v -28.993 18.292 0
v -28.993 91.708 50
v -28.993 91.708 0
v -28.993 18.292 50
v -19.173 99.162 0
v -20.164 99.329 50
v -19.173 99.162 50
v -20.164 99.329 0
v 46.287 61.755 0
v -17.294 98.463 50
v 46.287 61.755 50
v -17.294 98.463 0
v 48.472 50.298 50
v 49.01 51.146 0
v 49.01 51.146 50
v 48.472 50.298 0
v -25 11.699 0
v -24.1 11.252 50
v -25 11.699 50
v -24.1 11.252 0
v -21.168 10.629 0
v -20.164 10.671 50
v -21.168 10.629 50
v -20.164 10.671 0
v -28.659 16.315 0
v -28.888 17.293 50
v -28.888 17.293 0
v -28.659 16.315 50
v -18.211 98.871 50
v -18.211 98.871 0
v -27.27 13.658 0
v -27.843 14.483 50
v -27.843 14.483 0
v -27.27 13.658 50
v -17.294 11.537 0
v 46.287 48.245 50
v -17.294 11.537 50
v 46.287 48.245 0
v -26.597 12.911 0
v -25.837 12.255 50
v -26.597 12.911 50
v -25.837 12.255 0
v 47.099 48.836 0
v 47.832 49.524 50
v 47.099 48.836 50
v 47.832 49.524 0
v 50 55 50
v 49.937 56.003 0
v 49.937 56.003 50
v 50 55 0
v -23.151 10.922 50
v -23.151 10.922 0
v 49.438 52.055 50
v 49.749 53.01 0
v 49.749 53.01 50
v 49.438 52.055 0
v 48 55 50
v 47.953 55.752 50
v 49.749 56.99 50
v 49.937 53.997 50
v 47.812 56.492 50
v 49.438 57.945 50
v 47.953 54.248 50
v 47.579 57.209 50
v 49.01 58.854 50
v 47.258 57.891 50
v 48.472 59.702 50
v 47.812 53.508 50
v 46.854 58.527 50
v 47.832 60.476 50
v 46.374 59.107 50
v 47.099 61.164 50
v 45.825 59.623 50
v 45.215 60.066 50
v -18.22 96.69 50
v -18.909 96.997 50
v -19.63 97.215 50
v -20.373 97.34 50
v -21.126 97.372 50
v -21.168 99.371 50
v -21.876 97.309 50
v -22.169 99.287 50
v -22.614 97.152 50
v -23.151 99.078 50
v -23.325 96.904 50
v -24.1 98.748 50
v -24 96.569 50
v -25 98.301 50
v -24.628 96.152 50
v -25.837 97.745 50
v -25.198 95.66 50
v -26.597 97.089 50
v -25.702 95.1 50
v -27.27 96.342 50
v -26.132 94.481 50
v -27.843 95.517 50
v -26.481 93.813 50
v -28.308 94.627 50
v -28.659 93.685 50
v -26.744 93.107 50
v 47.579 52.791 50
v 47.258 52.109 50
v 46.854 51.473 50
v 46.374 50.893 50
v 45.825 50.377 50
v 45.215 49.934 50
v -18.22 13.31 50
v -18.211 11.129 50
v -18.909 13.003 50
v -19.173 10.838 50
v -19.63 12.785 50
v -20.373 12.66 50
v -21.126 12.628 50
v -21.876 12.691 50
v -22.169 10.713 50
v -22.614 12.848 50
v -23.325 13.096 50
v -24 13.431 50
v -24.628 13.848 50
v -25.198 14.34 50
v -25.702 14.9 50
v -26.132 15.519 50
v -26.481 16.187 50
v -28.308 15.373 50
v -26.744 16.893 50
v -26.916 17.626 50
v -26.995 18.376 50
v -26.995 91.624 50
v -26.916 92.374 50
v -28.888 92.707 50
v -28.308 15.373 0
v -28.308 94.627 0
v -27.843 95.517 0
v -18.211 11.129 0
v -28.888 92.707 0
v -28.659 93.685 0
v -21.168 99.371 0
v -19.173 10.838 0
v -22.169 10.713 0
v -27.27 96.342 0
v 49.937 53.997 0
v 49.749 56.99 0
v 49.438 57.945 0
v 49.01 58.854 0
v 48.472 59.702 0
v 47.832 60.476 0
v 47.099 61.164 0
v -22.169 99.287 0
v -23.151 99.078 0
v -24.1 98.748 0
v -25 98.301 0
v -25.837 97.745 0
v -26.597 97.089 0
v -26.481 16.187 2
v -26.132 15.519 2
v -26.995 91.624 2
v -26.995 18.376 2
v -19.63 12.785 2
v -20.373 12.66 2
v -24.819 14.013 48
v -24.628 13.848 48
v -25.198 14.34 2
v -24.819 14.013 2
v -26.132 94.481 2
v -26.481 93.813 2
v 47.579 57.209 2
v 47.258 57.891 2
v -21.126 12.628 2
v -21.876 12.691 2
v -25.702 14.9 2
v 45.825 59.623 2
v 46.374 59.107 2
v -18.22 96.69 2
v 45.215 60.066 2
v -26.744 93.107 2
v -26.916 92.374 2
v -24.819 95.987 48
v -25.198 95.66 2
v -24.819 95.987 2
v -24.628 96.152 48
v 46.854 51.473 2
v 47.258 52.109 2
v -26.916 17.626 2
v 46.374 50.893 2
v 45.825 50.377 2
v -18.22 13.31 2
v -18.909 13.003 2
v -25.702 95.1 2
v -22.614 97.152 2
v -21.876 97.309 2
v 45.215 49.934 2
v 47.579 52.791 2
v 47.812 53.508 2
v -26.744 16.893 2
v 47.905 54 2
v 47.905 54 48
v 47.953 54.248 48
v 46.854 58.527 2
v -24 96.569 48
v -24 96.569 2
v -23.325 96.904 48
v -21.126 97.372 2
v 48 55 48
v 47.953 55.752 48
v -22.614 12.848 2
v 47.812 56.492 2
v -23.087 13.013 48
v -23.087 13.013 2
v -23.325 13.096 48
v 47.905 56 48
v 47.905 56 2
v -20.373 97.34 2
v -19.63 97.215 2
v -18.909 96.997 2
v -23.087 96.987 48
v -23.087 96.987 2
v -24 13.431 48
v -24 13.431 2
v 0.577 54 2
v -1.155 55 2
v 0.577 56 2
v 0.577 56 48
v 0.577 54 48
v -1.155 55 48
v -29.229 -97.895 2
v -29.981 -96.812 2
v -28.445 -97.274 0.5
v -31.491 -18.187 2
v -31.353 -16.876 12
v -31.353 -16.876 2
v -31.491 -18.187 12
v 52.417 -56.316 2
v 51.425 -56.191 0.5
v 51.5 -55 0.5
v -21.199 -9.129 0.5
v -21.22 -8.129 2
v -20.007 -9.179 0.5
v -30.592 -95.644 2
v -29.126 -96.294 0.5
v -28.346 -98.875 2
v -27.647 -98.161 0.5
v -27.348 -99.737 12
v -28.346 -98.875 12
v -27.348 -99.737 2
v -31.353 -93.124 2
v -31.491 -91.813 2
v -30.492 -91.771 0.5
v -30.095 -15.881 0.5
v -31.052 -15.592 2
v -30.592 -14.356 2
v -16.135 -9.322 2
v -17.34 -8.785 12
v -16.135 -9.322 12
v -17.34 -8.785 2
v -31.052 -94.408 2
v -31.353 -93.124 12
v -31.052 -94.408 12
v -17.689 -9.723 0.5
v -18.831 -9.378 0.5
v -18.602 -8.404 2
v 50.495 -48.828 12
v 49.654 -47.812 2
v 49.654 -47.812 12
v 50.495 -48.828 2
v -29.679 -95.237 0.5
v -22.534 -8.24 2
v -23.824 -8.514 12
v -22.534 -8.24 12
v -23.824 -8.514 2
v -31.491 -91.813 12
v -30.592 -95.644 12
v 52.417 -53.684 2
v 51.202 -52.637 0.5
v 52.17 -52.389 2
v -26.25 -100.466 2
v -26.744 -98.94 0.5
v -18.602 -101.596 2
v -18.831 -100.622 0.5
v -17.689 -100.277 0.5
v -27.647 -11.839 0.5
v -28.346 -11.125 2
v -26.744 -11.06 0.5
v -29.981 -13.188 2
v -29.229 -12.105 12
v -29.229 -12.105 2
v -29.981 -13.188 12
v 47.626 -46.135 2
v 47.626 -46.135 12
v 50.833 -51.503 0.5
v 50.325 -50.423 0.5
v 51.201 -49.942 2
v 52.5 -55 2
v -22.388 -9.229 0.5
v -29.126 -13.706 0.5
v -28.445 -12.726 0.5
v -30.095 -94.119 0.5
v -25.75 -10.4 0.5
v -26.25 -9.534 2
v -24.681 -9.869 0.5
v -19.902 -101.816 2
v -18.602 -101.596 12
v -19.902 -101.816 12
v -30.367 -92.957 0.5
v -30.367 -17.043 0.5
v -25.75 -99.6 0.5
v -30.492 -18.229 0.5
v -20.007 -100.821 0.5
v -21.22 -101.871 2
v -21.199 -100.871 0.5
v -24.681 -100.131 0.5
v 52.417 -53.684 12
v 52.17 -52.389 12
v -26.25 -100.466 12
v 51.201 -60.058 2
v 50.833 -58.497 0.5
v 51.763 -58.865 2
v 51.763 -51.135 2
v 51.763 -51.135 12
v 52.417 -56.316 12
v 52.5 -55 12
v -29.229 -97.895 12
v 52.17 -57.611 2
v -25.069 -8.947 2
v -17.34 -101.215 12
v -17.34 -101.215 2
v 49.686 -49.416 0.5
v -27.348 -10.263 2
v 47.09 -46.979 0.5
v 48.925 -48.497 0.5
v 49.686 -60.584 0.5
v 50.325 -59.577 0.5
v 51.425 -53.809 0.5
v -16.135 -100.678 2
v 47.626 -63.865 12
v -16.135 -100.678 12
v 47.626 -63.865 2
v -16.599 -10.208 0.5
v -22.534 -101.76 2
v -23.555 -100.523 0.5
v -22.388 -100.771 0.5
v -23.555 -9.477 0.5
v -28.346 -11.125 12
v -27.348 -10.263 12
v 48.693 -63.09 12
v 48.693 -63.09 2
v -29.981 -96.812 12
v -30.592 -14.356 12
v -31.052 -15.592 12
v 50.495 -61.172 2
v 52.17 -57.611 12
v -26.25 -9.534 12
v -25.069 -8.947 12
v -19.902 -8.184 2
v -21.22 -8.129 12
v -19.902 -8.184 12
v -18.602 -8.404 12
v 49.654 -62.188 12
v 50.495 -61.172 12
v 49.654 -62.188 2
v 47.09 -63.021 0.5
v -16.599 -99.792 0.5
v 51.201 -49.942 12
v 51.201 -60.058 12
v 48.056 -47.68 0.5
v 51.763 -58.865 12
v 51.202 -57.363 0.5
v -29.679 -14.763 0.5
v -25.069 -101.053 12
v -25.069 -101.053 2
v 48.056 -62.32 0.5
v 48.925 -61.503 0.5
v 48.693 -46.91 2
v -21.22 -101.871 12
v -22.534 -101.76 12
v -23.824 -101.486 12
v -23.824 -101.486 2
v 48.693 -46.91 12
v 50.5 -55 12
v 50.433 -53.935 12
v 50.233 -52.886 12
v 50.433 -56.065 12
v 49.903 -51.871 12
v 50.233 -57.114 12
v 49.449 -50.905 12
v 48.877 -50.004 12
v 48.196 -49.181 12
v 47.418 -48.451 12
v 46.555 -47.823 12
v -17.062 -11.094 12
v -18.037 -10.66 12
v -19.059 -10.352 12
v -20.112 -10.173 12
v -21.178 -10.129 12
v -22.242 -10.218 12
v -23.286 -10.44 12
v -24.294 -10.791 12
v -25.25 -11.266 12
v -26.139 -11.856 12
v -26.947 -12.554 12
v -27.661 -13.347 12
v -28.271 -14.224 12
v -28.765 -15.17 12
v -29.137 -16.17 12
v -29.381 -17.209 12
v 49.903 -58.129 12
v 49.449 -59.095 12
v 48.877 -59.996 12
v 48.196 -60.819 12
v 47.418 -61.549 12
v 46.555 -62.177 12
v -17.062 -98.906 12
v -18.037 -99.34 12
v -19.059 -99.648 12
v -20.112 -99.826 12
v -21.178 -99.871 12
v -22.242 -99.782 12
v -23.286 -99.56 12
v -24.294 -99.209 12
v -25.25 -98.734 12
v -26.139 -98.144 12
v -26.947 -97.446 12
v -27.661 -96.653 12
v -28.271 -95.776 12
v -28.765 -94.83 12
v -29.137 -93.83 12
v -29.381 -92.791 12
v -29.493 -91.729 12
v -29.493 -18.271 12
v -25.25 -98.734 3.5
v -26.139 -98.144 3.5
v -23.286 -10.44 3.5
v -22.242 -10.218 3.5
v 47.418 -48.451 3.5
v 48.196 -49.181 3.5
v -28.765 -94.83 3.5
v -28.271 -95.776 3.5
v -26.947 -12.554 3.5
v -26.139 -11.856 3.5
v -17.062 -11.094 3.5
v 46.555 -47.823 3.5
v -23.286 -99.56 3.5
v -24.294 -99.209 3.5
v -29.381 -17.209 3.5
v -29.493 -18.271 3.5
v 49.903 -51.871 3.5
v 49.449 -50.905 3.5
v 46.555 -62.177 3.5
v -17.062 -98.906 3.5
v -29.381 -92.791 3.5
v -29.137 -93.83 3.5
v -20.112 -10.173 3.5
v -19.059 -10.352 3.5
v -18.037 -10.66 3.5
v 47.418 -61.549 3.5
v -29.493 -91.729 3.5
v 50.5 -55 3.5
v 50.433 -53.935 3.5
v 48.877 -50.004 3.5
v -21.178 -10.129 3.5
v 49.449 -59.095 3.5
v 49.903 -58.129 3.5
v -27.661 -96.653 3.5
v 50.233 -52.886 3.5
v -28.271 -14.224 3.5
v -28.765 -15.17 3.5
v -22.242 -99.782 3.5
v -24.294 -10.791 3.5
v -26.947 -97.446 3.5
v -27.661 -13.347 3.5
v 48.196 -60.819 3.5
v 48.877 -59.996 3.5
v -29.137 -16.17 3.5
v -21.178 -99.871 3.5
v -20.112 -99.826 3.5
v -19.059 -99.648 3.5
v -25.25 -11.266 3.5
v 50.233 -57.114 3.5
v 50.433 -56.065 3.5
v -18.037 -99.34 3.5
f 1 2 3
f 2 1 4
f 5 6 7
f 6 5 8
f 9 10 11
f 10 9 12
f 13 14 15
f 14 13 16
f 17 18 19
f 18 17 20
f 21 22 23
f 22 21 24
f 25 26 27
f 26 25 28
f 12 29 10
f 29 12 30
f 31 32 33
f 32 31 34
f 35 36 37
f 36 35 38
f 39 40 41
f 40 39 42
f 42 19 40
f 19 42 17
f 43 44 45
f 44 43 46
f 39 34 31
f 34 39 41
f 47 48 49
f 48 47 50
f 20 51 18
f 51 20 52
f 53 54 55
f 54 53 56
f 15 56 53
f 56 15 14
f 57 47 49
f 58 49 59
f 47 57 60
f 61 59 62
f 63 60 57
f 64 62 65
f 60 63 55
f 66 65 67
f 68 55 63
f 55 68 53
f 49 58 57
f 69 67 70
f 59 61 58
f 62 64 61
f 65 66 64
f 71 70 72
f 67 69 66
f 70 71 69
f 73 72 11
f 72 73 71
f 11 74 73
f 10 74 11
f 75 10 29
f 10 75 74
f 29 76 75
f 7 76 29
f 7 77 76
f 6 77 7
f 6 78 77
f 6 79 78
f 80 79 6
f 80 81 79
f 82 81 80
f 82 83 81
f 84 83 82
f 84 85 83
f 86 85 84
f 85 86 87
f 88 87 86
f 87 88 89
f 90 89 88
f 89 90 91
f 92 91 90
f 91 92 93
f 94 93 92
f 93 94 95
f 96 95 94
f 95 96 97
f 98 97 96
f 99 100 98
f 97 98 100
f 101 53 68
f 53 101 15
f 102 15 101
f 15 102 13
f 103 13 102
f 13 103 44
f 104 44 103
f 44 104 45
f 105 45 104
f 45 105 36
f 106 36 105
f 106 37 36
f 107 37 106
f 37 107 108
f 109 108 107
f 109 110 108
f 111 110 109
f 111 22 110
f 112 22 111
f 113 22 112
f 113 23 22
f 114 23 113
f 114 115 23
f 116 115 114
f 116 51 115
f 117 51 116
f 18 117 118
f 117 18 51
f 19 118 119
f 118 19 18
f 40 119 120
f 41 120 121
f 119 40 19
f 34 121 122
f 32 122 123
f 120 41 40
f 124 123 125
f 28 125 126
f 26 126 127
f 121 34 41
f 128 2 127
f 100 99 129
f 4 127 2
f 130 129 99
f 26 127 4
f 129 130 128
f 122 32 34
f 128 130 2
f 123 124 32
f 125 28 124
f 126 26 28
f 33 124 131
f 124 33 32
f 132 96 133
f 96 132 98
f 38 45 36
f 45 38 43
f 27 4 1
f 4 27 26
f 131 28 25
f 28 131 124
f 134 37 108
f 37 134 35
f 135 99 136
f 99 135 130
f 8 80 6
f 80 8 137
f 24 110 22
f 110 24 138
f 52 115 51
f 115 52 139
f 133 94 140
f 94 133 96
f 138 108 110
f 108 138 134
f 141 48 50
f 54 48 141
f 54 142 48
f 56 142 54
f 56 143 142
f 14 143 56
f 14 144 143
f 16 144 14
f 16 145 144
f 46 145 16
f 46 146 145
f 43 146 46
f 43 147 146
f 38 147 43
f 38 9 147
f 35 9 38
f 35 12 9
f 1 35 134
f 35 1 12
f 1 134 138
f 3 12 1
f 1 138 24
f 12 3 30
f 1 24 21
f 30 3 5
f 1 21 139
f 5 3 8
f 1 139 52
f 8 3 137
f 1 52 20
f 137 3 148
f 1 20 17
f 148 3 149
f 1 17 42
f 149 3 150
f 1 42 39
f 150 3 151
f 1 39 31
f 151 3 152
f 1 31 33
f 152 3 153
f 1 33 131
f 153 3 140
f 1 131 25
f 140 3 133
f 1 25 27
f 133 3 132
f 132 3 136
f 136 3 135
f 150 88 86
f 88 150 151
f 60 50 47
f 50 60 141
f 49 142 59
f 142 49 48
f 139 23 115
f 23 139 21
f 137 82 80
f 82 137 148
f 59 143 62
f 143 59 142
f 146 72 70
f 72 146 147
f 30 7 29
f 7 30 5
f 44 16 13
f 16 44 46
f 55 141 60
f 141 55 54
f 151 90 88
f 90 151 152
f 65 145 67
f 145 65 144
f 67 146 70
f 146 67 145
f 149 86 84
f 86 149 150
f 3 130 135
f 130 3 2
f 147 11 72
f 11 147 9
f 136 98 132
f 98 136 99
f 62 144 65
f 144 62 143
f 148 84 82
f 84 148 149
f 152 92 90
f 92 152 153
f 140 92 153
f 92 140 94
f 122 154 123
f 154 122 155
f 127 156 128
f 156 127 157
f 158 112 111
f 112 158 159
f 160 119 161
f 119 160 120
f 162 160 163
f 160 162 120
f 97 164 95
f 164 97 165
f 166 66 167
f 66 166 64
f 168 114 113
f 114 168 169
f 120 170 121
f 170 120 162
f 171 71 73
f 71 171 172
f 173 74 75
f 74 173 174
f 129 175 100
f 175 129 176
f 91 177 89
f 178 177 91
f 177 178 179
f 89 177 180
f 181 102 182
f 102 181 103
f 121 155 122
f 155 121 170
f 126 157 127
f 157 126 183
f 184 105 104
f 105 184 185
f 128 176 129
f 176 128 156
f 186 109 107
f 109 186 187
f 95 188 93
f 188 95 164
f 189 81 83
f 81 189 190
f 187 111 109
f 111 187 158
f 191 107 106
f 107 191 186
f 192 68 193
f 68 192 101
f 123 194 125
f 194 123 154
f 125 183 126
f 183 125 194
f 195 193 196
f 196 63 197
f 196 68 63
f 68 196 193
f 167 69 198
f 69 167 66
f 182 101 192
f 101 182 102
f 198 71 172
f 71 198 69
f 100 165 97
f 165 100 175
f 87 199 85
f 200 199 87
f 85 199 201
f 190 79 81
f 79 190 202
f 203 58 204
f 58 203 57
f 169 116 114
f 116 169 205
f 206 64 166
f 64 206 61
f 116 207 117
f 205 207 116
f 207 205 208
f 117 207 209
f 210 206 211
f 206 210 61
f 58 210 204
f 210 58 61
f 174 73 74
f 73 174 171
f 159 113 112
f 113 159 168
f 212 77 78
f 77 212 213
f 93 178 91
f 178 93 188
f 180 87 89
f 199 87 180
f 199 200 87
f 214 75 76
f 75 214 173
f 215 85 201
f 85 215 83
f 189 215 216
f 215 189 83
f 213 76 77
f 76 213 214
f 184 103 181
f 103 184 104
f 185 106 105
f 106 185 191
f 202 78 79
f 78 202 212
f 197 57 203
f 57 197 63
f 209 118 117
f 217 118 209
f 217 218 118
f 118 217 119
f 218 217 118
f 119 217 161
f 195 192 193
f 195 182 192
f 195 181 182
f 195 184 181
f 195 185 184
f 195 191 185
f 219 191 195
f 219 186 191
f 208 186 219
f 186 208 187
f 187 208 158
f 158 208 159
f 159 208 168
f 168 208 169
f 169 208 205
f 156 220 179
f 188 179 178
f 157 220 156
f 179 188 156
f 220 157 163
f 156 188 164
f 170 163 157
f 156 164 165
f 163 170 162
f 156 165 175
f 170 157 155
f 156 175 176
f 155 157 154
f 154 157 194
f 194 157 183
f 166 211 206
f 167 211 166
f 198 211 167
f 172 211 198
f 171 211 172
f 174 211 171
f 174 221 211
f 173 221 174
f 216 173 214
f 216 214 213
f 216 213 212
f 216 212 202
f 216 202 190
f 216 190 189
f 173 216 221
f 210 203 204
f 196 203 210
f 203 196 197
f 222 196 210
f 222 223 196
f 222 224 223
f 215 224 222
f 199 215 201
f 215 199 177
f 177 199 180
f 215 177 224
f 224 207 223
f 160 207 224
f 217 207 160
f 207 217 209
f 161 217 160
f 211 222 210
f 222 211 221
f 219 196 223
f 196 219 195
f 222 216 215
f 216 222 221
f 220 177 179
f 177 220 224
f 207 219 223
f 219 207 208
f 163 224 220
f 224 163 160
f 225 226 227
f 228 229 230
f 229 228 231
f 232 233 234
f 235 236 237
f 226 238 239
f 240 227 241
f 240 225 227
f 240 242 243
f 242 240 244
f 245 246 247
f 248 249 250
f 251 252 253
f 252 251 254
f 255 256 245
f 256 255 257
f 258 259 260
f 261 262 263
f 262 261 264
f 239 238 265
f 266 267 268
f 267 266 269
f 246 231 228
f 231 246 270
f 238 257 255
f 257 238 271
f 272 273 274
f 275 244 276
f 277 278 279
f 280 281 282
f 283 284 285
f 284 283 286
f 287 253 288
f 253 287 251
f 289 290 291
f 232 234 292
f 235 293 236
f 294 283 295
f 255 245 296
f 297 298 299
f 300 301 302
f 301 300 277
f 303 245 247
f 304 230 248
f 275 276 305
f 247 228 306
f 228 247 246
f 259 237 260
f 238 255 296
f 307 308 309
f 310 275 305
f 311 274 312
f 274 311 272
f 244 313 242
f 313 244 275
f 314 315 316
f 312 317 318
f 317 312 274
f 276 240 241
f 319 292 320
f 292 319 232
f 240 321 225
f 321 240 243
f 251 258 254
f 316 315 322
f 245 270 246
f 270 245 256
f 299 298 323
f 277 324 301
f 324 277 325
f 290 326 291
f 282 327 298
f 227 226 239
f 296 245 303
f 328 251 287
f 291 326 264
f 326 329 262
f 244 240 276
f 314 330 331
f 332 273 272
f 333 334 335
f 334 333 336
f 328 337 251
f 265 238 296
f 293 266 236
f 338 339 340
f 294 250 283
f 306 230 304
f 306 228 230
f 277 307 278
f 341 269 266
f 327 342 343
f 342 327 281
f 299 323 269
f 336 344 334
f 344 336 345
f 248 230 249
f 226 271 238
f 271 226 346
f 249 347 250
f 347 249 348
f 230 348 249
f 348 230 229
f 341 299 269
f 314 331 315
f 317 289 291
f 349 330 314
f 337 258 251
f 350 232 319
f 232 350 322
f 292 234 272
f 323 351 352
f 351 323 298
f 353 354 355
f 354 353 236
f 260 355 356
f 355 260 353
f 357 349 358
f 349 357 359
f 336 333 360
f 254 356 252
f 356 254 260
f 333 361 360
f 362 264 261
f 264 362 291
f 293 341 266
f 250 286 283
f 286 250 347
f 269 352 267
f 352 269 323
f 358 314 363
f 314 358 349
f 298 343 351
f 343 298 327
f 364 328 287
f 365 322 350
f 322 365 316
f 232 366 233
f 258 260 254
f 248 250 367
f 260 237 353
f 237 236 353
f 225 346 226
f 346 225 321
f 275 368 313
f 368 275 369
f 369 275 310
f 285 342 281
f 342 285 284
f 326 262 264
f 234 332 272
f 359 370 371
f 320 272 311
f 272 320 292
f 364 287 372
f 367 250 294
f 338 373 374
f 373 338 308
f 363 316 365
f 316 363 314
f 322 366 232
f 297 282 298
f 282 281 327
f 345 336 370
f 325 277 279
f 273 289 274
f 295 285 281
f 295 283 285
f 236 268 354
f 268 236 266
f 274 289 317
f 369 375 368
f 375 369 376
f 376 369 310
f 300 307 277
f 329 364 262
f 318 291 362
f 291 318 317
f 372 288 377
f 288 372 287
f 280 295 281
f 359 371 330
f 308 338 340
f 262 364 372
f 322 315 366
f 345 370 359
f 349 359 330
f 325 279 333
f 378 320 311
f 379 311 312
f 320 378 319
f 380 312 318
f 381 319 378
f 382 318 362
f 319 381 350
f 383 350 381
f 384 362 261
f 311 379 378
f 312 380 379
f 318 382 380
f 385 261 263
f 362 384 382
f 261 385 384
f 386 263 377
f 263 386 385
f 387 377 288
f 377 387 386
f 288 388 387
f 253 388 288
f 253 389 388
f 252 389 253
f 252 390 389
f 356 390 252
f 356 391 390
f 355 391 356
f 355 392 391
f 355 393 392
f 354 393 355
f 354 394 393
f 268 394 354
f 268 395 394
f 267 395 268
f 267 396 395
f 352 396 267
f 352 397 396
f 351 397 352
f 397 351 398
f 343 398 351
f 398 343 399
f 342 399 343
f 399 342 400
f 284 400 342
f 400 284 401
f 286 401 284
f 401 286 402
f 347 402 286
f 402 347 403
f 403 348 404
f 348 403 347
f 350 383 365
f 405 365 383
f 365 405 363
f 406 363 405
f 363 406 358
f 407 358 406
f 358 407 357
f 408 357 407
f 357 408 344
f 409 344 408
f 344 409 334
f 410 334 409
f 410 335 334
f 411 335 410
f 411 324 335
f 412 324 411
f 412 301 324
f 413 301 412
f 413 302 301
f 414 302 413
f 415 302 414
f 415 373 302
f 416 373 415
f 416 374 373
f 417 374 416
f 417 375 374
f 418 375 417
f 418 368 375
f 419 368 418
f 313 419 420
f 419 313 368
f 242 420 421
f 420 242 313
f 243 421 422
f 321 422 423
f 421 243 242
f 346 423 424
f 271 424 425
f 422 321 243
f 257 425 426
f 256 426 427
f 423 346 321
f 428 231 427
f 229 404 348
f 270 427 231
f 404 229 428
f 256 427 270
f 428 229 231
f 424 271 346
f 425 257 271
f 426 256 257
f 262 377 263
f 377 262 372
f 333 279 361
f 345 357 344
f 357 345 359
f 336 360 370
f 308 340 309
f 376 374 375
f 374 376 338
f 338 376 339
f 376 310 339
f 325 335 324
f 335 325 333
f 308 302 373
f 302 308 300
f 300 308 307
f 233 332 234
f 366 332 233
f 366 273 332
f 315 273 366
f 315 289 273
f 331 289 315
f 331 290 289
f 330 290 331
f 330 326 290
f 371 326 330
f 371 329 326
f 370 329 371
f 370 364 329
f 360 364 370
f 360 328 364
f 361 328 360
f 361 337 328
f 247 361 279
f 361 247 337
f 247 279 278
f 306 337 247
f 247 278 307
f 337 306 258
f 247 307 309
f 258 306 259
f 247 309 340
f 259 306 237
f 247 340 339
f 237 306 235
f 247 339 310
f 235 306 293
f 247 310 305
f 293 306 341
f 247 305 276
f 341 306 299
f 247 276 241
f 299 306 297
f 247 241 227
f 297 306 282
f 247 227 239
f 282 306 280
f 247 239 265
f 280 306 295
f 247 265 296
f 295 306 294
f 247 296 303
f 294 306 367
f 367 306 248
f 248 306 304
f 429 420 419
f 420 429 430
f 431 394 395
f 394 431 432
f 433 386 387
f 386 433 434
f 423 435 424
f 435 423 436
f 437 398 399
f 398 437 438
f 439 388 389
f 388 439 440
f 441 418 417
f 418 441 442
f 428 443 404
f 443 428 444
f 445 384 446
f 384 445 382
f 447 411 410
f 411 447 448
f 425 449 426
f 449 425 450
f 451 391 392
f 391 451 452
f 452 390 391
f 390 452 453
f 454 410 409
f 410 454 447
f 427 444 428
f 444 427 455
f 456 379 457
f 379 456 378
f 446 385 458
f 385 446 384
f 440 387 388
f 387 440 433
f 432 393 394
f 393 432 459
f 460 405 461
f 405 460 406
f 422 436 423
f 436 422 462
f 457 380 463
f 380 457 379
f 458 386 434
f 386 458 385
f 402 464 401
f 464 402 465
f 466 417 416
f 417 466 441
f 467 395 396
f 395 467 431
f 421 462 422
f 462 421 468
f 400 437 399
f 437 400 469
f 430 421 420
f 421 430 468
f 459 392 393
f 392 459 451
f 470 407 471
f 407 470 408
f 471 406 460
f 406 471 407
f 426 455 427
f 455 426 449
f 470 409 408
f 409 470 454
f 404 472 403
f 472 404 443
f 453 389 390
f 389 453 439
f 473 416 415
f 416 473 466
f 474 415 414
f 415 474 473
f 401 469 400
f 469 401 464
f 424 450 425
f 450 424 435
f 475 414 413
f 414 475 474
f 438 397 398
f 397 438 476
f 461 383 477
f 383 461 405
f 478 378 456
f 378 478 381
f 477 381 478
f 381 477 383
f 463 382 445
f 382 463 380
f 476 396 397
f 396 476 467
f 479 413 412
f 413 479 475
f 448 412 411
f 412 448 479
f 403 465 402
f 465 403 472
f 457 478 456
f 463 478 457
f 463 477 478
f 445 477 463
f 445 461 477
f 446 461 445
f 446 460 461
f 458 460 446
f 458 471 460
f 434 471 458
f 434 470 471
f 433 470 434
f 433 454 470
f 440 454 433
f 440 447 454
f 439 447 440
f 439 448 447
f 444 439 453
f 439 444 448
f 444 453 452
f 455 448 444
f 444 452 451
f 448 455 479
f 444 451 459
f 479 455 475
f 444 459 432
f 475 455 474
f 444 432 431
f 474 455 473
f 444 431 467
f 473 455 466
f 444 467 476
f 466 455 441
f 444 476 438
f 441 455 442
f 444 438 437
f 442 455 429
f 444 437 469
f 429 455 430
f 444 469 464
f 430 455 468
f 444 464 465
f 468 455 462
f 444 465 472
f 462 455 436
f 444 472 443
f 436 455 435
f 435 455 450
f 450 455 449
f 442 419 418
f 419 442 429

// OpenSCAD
// trinket_box.scad
// library for parametric Trinket Box, Container, Enclosure, Organizer, Storage
// Author: Tony Z. Tonchev, Michigan (USA) 
// last update: February 2019

// PolyBox Number of Sides
PolyBox_Sides = 3; //[3:3-SIDED, 4:4-SIDED, 5:5-SIDED, 6:6-SIDED, 7:7-SIDED, 8:8-SIDED]

// Polybox Diameter (in mm)
PolyBox_Diameter = 100;

// Polybox Depth (in mm)
PolyBox_Depth = 50;

// Box corner radius (in mm)
PolyBox_Corner_Radius = 8; //[4:50]

// Box Thickness
PolyBox_Thickness = 2; //[1:5]

// Group
Build_Group = 1; //[1:BOTH, 2:BOX, 3:LID]

/* [Hidden] */

TZT_S = PolyBox_Sides;
TZT_R = PolyBox_Diameter/2;
TZT_D = PolyBox_Depth;
TZT_C = PolyBox_Corner_Radius;
TZT_T = PolyBox_Thickness;
$fn=50;


//TZT_Box ([sides, radius, depth, corner_radius])

if (Build_Group!=3) translate ([0,TZT_R*1.1,0]) TZT_Box ();
if (Build_Group!=2) translate ([0,-TZT_R*1.1,0]) TZT_Lid ();

module TZT_Lid () {
    translate ([0,0,7])
    difference () {
        hull () {
            TZT_Vol ([TZT_S,TZT_R+TZT_T+.5,10,TZT_C+TZT_T+.5]);
            translate ([0,0,-6]) TZT_Vol ([TZT_S,TZT_R+TZT_T-.5,1,TZT_C+TZT_T-.5]);
        }
        translate ([0,0,TZT_T]) TZT_Vol ([TZT_S,TZT_R+.5,11,TZT_C+.5]);
    }
}

module TZT_Box () {
    translate ([0,0,TZT_D/2])
        difference () {
            TZT_Vol ([TZT_S,TZT_R,TZT_D,TZT_C]);
            translate ([0,0,TZT_T]) TZT_Vol ([TZT_S,TZT_R-TZT_T,TZT_D,TZT_C-TZT_T]);
        }
        translate ([0,0,TZT_T]) TZT_Div ([TZT_S,TZT_R-TZT_T,TZT_D,TZT_C-TZT_T]);
}

module TZT_Vol (TZT) {
    hull ()
        for (i=[0:360/TZT[0]:359])
        rotate ([0,0,i])
        translate ([TZT[1]-TZT[3], 0, 0]) 
        cylinder (TZT[2], TZT[3], TZT[3], true);
}

module TZT_Div (TZT) {
    for (i=[0:360/TZT[0]:359])
        rotate ([0,0,i])
        translate ([TZT[1]/2, 0, TZT_D/2-TZT_T*1.5]) 
        cube ([TZT[1],TZT_T,TZT[2]-TZT_T],true);
}
